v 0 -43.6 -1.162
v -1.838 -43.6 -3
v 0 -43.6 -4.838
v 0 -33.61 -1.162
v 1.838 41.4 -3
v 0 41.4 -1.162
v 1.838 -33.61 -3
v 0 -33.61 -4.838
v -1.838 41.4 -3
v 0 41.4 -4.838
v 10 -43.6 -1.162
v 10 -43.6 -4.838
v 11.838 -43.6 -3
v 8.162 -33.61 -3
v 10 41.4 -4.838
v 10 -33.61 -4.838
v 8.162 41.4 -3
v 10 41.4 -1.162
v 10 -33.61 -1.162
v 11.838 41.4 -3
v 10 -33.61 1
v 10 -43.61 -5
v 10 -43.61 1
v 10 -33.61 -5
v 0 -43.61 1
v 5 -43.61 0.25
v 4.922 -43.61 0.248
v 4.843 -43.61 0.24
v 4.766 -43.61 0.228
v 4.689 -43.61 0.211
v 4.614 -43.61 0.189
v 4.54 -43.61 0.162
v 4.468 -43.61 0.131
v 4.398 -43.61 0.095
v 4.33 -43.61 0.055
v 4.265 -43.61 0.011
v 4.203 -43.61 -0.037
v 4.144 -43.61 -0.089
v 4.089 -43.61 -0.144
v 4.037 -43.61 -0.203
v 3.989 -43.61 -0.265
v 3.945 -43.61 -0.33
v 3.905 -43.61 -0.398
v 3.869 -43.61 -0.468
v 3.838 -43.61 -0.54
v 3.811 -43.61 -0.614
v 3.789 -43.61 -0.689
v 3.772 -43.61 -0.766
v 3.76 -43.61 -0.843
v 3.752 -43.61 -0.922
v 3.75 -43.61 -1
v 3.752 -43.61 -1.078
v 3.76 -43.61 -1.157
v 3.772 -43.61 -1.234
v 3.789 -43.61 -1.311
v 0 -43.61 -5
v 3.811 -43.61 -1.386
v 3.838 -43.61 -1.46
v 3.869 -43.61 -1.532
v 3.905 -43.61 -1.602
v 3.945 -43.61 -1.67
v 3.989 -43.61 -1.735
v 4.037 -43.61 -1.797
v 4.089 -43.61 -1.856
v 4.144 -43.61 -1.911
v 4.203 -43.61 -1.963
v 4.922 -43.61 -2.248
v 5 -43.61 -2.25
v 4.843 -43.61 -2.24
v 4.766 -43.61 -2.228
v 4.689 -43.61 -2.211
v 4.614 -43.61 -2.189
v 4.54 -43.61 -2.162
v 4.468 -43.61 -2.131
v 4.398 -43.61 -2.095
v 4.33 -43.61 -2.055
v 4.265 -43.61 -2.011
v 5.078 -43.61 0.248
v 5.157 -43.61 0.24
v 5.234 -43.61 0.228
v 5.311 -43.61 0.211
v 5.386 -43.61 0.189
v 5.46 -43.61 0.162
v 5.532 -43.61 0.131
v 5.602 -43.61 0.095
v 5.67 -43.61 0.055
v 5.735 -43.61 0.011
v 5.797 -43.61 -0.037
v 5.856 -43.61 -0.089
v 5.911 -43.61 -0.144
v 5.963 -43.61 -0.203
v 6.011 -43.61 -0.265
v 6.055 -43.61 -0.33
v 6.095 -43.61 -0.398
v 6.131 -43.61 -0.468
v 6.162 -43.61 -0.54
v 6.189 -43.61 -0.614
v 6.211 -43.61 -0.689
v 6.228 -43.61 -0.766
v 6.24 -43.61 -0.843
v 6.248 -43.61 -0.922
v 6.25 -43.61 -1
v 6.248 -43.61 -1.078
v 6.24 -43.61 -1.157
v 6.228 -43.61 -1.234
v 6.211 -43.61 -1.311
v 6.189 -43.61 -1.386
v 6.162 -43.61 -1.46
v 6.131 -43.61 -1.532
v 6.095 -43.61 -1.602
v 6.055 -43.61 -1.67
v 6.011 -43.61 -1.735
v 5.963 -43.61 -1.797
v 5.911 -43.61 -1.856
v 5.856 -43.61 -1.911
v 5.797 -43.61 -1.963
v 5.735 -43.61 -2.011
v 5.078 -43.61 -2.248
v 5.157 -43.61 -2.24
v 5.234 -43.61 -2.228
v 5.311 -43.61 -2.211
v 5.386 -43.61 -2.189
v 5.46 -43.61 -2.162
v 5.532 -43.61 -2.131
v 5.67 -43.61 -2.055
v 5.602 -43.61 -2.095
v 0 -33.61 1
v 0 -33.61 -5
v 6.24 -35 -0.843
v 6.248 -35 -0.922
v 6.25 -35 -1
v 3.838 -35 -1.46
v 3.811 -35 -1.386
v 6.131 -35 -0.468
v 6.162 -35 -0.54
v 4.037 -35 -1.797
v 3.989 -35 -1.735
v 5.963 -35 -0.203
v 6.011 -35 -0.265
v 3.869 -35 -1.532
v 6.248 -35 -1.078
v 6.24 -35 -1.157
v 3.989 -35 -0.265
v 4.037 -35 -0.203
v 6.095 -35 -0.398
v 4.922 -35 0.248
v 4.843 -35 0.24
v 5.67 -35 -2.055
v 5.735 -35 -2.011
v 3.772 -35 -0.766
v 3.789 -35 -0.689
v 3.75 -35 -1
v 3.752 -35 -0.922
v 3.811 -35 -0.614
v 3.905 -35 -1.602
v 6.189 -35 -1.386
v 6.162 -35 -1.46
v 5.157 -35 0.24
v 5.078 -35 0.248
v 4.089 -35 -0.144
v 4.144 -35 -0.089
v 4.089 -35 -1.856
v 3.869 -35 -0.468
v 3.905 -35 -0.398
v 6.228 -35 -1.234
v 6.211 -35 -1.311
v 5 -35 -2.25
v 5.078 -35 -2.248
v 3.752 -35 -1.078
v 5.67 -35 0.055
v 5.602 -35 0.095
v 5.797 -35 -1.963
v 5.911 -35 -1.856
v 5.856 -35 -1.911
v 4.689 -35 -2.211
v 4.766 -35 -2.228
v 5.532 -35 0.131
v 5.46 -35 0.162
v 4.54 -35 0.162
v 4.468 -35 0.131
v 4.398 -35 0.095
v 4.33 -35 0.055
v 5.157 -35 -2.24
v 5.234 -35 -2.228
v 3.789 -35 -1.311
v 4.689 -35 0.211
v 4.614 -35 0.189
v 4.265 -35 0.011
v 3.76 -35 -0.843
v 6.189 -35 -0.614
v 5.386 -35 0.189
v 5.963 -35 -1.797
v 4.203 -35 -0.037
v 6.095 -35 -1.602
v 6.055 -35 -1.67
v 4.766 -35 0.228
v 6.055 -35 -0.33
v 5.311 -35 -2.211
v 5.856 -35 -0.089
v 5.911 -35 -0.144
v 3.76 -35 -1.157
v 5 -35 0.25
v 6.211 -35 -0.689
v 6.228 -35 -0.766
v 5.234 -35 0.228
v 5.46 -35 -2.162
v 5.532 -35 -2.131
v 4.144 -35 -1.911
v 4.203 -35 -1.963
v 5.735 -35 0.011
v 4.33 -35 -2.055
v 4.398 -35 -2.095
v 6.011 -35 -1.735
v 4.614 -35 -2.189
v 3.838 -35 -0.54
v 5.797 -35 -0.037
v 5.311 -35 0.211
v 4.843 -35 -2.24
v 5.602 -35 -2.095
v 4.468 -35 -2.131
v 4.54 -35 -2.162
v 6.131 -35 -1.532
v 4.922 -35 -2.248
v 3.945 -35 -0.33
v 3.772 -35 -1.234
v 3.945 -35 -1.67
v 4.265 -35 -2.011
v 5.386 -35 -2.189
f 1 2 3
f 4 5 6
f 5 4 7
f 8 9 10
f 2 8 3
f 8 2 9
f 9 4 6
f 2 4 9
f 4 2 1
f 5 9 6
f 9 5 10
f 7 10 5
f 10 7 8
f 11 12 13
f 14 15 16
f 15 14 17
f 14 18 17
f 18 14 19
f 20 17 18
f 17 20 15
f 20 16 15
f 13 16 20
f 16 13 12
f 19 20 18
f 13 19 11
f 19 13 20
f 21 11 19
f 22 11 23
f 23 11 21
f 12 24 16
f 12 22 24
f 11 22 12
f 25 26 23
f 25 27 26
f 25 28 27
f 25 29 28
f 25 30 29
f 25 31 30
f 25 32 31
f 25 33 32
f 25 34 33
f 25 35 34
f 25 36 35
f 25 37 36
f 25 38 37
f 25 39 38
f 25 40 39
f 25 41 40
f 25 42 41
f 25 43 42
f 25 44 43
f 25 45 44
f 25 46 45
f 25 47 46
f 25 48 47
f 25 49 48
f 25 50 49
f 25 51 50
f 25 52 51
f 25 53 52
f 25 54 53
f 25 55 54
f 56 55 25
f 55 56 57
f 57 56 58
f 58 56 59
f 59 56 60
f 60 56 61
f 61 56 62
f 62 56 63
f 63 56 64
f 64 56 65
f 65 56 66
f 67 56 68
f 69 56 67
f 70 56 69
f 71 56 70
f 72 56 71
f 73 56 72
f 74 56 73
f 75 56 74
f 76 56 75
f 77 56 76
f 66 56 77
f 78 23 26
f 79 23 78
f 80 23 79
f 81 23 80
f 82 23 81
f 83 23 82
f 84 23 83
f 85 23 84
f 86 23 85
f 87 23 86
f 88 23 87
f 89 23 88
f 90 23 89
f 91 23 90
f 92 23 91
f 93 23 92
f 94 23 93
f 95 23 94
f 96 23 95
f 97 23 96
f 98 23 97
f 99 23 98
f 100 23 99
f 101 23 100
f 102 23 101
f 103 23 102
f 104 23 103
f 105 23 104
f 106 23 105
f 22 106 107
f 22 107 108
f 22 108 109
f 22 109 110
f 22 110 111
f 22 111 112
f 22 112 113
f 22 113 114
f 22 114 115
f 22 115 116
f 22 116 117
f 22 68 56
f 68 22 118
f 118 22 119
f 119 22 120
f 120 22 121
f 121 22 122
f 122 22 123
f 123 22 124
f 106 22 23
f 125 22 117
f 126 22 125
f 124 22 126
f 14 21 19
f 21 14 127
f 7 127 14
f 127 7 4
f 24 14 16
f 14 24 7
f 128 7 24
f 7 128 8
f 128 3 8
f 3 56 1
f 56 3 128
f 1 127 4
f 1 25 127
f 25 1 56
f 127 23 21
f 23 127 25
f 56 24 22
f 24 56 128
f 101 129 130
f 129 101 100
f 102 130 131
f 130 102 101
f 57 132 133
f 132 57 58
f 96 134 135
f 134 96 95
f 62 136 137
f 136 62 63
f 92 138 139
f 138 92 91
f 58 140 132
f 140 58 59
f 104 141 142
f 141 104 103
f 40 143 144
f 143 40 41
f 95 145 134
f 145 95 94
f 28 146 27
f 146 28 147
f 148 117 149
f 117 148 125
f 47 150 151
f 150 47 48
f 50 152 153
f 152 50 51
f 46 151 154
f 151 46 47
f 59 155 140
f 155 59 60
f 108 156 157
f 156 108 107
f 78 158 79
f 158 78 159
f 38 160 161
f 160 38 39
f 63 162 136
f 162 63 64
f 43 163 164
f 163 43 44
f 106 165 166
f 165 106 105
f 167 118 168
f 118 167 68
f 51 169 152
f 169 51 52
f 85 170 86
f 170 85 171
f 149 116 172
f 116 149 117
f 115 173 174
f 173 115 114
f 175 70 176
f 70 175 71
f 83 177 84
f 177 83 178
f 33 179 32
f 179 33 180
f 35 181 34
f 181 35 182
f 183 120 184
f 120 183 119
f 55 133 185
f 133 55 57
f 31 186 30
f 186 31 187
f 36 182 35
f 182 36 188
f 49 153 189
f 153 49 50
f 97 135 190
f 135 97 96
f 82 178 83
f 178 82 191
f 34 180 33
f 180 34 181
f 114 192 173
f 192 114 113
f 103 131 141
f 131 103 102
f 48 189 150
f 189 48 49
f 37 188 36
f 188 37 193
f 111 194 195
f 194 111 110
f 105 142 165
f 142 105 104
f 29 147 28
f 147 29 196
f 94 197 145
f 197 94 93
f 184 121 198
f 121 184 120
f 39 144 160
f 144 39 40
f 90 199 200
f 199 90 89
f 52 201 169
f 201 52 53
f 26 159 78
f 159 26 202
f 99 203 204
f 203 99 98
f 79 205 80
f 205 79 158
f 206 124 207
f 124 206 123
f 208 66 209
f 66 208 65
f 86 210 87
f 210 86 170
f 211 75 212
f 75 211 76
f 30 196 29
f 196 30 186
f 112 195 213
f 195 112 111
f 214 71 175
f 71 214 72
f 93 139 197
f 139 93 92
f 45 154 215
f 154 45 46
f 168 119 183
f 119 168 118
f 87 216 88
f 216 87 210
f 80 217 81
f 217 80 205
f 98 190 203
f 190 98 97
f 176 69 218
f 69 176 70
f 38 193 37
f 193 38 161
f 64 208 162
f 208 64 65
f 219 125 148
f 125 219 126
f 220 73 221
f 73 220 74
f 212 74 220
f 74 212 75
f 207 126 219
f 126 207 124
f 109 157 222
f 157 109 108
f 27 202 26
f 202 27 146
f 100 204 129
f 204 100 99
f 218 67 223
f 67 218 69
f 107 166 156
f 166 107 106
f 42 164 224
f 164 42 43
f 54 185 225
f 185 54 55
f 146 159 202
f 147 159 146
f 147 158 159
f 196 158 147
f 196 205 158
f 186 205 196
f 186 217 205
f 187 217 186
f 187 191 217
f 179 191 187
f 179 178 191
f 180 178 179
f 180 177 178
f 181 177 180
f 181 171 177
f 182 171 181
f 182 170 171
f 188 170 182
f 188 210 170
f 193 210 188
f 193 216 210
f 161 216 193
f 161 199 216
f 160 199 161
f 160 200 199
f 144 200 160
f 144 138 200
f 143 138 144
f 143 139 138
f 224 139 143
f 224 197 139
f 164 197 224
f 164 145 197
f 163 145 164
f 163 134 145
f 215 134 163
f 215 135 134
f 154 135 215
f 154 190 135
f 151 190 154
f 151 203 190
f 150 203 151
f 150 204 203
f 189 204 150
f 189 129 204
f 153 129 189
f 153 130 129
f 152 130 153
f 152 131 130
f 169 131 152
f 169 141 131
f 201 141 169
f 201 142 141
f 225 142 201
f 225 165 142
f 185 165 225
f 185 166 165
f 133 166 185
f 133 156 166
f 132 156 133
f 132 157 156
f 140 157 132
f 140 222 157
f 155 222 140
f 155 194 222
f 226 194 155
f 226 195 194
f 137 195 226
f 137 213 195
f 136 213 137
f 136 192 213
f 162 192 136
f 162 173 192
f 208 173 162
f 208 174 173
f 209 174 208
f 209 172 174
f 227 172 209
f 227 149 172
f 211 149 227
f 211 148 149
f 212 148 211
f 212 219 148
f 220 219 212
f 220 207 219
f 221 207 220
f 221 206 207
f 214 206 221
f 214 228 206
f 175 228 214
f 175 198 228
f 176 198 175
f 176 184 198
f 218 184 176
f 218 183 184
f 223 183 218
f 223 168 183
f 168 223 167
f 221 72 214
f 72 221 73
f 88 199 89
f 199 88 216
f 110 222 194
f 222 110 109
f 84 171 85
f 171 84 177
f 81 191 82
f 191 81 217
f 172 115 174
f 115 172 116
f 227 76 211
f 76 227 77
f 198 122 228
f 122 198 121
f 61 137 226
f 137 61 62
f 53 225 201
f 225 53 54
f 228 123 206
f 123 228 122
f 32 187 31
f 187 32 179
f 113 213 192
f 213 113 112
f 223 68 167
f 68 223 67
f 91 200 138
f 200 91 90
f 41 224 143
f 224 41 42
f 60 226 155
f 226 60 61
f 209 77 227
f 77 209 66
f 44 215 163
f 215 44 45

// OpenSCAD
// file: openscad-extra/openscad-extra/countersink.scad
/*
Countersink depression for screw heads.
*/
include <../settings.scad>;
use <../openscad-extra/countersink.scad>;

/*
module make_countersink(d1=0, d2=0, h=0, l=0, outer=100, inner=200, bt_extra=0, $fn=25){
    extra = 0.5;
    d1 = d1 ? d1 : screw_thread_diameter;
    d2 = d2 ? d2 : screw_head_diameter;
    h = h ? h : screw_head_height;
    
    union(){
        cylinder(d1=d1, d2=d2, h=h+extra, center=true, $fn=$fn);
        
        if(l)
        cylinder(d=d1, h=l, center=true, $fn=$fn);
    
        // big top
    	translate([0,0,(h+extra)/2])
    	cylinder(d=d2+bt_extra, h=outer, center=false, $fn=$fn);

    	// lower bottom
    	translate([0,0,-(h+extra)/2-inner])
    	cylinder(d=d1, h=inner, center=false, $fn=$fn);
	}
}
*/

module make_countersink_motor(){
    make_countersink(
        d1=motor_mount_holes_width,
        d2=motor_mount_holes_head_width,
        h=motor_mount_holes_head_height);
}

make_countersink();
// file: openscad-extra/settings.scad
// Common settings used by all scad files.

// ALL UNITS IN MILLIMETERS (MM)!!!

$fn = 30;//low-res but fast to render
//$fn = 50;//higher-res but slow to render

pi = 3.1415926535897932384626433832795;

max_footprint = 150; // 15x15 cm

bottom_clearance = 10;
bottom_clearance = 25.4/2+10;
//bottom_clearance = 30;

shell_alpha = 0.215;
//shell_alpha = 1.0;

tolerance = 0.5;

// Flat countersunk M2.5mm x 0.45mm machine screw.
screw_thread_diameter = 2.5;//2.8;//2.75;//2.4?
screw_thread_length = 5;//?
screw_head_diameter = 4.75; // M2.5
//screw_head_diameter = 5.2; // M3
screw_head_height = 1.5;//2;

screw_thread_diameter2 = 2;

unit_thickness = 5;
u = unit_thickness;

shell_thickness = unit_thickness;

// Show flags.
show_platform = 1;
show_head = 1;
show_head_shell = 0;
show_head_electronics_bb = 0;
show_inner_head = 0;
show_battery = 1;
show_foot_cube = 0;
show_torso = 0;
show_motor = 0;
show_motor_wheeled_layout = 1;
show_motor_treads = 0;
show_motor_plates = 1;
show_motor_inner_plates = 1;
show_motor_outer_plates = 1;
show_wheel = 0;//obsolete
show_tracks = 1;//
show_track_wheels = 1;
show_caster = 0;
show_rpi = 1;
show_vertical_plates = 1;//
show_horizontal_plates = 1;//
show_caster_plates = 0;//obsolete?
show_camera = 1;
show_screen = 0;
show_edge_mount = 1;
show_sonar_mount = 1;
show_recharge_mount = 1;
show_conduit = 1;
show_torso_shell = 0;
show_recharge_dock = 0;
show_head_tilt_axis = 0;
show_rpi_camera_axis = 0;
show_laser_axis = 0;

head_vertical_angle_tilt = 0;
//head_vertical_angle_tilt = 30;//max
//head_vertical_angle_tilt = 10;

torso_height = 120+20;

base_plate_diameter = max_footprint-unit_thickness*2;
base_plate_frame = 0;

head_height = 50;
head_offset_z = max_footprint/2;
head_middle_cutout = 85;

rpi_with_four_hats_and_clearance = 76;

motor_gear_teeth = 26;

qrd1114_w = 6.10;
qrd1114_l = 4.39;
qrd1114_h = 4.65;

dock_radius = 10;
dock_gripper_border = 2;
dock_gripper_instep = 0.9;
dock_gripper_cutout_tapper = 50;
dock_receiver_height = 5;

// Patriod Fuel+ 9000 mAh
battery_length = 90;
battery_width = 57;
battery_height = 23;
battery_offset_z = 30;//4;

wheel_diameter = 50;
wheel_offset_x = 65;
wheel_offset_z = wheel_diameter/2;
wheel_axle_diameter = 5;

//caster_diameter = 19.05; // 0.75 inches
caster_diameter = 25.45; // 1 inches
//caster_diameter = 15.875; // 5/8 inches
caster_holder_diameter = 30;//31;
caster_offset_y = base_plate_diameter/2 - caster_holder_diameter/2;

arduino_offset_x = 0;
arduino_offset_y = 0;
arduino_offset_z = 67;
arduino_offset_x2 = 0;
arduino_offset_y2 = -20;
arduino_offset_z2 = torso_height+bottom_clearance;

horizontal_plate_width = unit_thickness*8*2 - unit_thickness*2;
horizontal_plate_depth = unit_thickness*8*2;

vertical_plate_width = horizontal_plate_depth;
vertical_plate_height = unit_thickness*8;
vertical_plate_offset_x = wheel_offset_x-22.5;
vertical_plate_offset_z = vertical_plate_height/2 + unit_thickness/2;

vertical_battery_plate_height = 100 - 15;

caster_plate_width = horizontal_plate_width + unit_thickness*2;
caster_plate_mount_length = unit_thickness*4;
caster_plate_width_minor = caster_holder_diameter;

motor_switch_length = 20;
motor_switch_thickness = 6.5;
motor_switch_height = 11;
motor_switch_height_leads = 23;
motor_switch_on_height =  13.3;
motor_switch_hole_diameter = 2.5;
motor_switch_hole_offset_z = 6.5;//this plus diameter/2 is hole center from switch top
motor_switch_hole_spacing = 7.1;// holes are diameter/2 from this

motor_length = 60;
motor_width = 25;
motor_collar_width = 7;
motor_collar_height = 2.5;
motor_axle_width = 4;
motor_axle_height = 9.5;
motor_offset_x = 10;
//motor_offset_y = motor_width/2+5;
motor_offset_y = unit_thickness*3.5;
motor_offset_z = vertical_plate_height/2 - unit_thickness/2;//4;//30;
motor_mount_holes_dist = 17;
// motor countersink hole
motor_mount_holes_width = 3; // M3
motor_mount_holes_head_height = 2.2;
motor_mount_holes_head_width = 5.8;
motor_bearing_outer_diameter = 10;
motor_bearing_inner_diameter = 5.95;
motor_bearing_thickness = 2.5;

motor_unimount_idler_axle_d = screw_thread_diameter;
//motor_unimount_spacer_depth = 0.1;//too small
motor_unimount_spacer_depth = 0.5;

motor_arm_offset_y = -u*3;
motor_arm_offset_z = u*.5;

motor_plate_width = vertical_plate_width;
motor_plate_height = vertical_plate_height;
motor_plate_thickness = unit_thickness;
motor_plate_offset_z = vertical_plate_offset_z;

motor_plate_middle_thickness = 5;

wheel_hub_offset = u*3;

motor_hole_height_offset = -5;

nylon_spacer_outer_diameter = 6.35;
nylon_spacer_inner_diameter = 3.302;
nylon_spacer_length = 12.7;

track_width = unit_thickness*3;
track_offset_x = -50;
track_offset_z = .1;
//track_wheel_radius = 19;//original
track_wheel_radius = 14;
//track_wheel_hole_radius = (nylon_spacer_outer_diameter+1)/2;
track_wheel_hole_radius = motor_bearing_outer_diameter/2;

track_driver_hole_radius = (motor_axle_width)/2 + 0.1;
track_driver_set_screw_head_d = 4.1;
track_driver_set_screw_shaft_d = 2.4;
//track_wheel_width = 13.5;//original
track_wheel_width = u*2;
track_wheel_width_buffer = u*0.25;
track_offset = 3;        //distance from chassis
track_wheel_offset = track_offset;
//track_length = 250; // see tread_triangle.py, too big
//track_length = 240; // see tread_triangle.py
//track_length = 238; //inc/dec in 10 unit increments so notches match idlers
track_length = 228; //inc/dec in 10 unit increments so notches match idlers
track_radius = track_length/2/pi;
track_wheel_show_fancy = 1;
track_wheel_gap = track_wheel_width + track_wheel_width_buffer*2;
track_axle_bearing_diameter = motor_bearing_inner_diameter - 0.1;
track_tensioner_radius = 12;
track_nut_height = 3.5; //TODO
track_punchout_thickness = 0.25;//should be the same as the minimum layer thickness

head_slew_bearing_outer_diameter = 115;
head_slew_bearing_ring_thickness = 20;
head_slew_bearing_inner_diameter = head_slew_bearing_outer_diameter - head_slew_bearing_ring_thickness;
//head_slew_bearing_hole_diameter = head_slew_bearing_inner_diameter - head_slew_bearing_ring_thickness;
head_slew_bearing_hole_diameter = 12+tolerance; // slip ring https://www.adafruit.com/products/775
//head_slew_bearing_ball_diameter = 5;
head_slew_bearing_ball_diameter = 2.5; //u/2;
head_slew_bearing_height = u;//head_slew_bearing_ball_diameter*2;
head_slew_bearing_gap = 0.5;
head_slew_bearing_slew_gap = 0;
head_slew_bearing_gap_factor = 0.1;

neck_strut_width = u*7;
neck_strut_height = u*18;
neck_strut_spacing = u*8;

show_outer_race = 0;
show_inner_race_a = 1;
show_inner_race_b = 1;
show_balls = 0;
// file: openscad-extra/src/countersink.scad
/*
Countersink depression for screw heads.
*/
include <../settings.scad>;
use <../openscad-extra/countersink.scad>;

/*
module make_countersink(d1=0, d2=0, h=0, l=0, outer=100, inner=200, bt_extra=0, $fn=25){
    extra = 0.5;
    d1 = d1 ? d1 : screw_thread_diameter;
    d2 = d2 ? d2 : screw_head_diameter;
    h = h ? h : screw_head_height;
    
    union(){
        cylinder(d1=d1, d2=d2, h=h+extra, center=true, $fn=$fn);
        
        if(l)
        cylinder(d=d1, h=l, center=true, $fn=$fn);
    
        // big top
    	translate([0,0,(h+extra)/2])
    	cylinder(d=d2+bt_extra, h=outer, center=false, $fn=$fn);

    	// lower bottom
    	translate([0,0,-(h+extra)/2-inner])
    	cylinder(d=d1, h=inner, center=false, $fn=$fn);
	}
}
*/

module make_countersink_motor(){
    make_countersink(
        d1=motor_mount_holes_width,
        d2=motor_mount_holes_head_width,
        h=motor_mount_holes_head_height);
}

make_countersink();
// main file
use <layout.scad>;

translate([0,0,0])
rotate([90,0,0])
lens_holder_rack(bb=0, buffer=0);
